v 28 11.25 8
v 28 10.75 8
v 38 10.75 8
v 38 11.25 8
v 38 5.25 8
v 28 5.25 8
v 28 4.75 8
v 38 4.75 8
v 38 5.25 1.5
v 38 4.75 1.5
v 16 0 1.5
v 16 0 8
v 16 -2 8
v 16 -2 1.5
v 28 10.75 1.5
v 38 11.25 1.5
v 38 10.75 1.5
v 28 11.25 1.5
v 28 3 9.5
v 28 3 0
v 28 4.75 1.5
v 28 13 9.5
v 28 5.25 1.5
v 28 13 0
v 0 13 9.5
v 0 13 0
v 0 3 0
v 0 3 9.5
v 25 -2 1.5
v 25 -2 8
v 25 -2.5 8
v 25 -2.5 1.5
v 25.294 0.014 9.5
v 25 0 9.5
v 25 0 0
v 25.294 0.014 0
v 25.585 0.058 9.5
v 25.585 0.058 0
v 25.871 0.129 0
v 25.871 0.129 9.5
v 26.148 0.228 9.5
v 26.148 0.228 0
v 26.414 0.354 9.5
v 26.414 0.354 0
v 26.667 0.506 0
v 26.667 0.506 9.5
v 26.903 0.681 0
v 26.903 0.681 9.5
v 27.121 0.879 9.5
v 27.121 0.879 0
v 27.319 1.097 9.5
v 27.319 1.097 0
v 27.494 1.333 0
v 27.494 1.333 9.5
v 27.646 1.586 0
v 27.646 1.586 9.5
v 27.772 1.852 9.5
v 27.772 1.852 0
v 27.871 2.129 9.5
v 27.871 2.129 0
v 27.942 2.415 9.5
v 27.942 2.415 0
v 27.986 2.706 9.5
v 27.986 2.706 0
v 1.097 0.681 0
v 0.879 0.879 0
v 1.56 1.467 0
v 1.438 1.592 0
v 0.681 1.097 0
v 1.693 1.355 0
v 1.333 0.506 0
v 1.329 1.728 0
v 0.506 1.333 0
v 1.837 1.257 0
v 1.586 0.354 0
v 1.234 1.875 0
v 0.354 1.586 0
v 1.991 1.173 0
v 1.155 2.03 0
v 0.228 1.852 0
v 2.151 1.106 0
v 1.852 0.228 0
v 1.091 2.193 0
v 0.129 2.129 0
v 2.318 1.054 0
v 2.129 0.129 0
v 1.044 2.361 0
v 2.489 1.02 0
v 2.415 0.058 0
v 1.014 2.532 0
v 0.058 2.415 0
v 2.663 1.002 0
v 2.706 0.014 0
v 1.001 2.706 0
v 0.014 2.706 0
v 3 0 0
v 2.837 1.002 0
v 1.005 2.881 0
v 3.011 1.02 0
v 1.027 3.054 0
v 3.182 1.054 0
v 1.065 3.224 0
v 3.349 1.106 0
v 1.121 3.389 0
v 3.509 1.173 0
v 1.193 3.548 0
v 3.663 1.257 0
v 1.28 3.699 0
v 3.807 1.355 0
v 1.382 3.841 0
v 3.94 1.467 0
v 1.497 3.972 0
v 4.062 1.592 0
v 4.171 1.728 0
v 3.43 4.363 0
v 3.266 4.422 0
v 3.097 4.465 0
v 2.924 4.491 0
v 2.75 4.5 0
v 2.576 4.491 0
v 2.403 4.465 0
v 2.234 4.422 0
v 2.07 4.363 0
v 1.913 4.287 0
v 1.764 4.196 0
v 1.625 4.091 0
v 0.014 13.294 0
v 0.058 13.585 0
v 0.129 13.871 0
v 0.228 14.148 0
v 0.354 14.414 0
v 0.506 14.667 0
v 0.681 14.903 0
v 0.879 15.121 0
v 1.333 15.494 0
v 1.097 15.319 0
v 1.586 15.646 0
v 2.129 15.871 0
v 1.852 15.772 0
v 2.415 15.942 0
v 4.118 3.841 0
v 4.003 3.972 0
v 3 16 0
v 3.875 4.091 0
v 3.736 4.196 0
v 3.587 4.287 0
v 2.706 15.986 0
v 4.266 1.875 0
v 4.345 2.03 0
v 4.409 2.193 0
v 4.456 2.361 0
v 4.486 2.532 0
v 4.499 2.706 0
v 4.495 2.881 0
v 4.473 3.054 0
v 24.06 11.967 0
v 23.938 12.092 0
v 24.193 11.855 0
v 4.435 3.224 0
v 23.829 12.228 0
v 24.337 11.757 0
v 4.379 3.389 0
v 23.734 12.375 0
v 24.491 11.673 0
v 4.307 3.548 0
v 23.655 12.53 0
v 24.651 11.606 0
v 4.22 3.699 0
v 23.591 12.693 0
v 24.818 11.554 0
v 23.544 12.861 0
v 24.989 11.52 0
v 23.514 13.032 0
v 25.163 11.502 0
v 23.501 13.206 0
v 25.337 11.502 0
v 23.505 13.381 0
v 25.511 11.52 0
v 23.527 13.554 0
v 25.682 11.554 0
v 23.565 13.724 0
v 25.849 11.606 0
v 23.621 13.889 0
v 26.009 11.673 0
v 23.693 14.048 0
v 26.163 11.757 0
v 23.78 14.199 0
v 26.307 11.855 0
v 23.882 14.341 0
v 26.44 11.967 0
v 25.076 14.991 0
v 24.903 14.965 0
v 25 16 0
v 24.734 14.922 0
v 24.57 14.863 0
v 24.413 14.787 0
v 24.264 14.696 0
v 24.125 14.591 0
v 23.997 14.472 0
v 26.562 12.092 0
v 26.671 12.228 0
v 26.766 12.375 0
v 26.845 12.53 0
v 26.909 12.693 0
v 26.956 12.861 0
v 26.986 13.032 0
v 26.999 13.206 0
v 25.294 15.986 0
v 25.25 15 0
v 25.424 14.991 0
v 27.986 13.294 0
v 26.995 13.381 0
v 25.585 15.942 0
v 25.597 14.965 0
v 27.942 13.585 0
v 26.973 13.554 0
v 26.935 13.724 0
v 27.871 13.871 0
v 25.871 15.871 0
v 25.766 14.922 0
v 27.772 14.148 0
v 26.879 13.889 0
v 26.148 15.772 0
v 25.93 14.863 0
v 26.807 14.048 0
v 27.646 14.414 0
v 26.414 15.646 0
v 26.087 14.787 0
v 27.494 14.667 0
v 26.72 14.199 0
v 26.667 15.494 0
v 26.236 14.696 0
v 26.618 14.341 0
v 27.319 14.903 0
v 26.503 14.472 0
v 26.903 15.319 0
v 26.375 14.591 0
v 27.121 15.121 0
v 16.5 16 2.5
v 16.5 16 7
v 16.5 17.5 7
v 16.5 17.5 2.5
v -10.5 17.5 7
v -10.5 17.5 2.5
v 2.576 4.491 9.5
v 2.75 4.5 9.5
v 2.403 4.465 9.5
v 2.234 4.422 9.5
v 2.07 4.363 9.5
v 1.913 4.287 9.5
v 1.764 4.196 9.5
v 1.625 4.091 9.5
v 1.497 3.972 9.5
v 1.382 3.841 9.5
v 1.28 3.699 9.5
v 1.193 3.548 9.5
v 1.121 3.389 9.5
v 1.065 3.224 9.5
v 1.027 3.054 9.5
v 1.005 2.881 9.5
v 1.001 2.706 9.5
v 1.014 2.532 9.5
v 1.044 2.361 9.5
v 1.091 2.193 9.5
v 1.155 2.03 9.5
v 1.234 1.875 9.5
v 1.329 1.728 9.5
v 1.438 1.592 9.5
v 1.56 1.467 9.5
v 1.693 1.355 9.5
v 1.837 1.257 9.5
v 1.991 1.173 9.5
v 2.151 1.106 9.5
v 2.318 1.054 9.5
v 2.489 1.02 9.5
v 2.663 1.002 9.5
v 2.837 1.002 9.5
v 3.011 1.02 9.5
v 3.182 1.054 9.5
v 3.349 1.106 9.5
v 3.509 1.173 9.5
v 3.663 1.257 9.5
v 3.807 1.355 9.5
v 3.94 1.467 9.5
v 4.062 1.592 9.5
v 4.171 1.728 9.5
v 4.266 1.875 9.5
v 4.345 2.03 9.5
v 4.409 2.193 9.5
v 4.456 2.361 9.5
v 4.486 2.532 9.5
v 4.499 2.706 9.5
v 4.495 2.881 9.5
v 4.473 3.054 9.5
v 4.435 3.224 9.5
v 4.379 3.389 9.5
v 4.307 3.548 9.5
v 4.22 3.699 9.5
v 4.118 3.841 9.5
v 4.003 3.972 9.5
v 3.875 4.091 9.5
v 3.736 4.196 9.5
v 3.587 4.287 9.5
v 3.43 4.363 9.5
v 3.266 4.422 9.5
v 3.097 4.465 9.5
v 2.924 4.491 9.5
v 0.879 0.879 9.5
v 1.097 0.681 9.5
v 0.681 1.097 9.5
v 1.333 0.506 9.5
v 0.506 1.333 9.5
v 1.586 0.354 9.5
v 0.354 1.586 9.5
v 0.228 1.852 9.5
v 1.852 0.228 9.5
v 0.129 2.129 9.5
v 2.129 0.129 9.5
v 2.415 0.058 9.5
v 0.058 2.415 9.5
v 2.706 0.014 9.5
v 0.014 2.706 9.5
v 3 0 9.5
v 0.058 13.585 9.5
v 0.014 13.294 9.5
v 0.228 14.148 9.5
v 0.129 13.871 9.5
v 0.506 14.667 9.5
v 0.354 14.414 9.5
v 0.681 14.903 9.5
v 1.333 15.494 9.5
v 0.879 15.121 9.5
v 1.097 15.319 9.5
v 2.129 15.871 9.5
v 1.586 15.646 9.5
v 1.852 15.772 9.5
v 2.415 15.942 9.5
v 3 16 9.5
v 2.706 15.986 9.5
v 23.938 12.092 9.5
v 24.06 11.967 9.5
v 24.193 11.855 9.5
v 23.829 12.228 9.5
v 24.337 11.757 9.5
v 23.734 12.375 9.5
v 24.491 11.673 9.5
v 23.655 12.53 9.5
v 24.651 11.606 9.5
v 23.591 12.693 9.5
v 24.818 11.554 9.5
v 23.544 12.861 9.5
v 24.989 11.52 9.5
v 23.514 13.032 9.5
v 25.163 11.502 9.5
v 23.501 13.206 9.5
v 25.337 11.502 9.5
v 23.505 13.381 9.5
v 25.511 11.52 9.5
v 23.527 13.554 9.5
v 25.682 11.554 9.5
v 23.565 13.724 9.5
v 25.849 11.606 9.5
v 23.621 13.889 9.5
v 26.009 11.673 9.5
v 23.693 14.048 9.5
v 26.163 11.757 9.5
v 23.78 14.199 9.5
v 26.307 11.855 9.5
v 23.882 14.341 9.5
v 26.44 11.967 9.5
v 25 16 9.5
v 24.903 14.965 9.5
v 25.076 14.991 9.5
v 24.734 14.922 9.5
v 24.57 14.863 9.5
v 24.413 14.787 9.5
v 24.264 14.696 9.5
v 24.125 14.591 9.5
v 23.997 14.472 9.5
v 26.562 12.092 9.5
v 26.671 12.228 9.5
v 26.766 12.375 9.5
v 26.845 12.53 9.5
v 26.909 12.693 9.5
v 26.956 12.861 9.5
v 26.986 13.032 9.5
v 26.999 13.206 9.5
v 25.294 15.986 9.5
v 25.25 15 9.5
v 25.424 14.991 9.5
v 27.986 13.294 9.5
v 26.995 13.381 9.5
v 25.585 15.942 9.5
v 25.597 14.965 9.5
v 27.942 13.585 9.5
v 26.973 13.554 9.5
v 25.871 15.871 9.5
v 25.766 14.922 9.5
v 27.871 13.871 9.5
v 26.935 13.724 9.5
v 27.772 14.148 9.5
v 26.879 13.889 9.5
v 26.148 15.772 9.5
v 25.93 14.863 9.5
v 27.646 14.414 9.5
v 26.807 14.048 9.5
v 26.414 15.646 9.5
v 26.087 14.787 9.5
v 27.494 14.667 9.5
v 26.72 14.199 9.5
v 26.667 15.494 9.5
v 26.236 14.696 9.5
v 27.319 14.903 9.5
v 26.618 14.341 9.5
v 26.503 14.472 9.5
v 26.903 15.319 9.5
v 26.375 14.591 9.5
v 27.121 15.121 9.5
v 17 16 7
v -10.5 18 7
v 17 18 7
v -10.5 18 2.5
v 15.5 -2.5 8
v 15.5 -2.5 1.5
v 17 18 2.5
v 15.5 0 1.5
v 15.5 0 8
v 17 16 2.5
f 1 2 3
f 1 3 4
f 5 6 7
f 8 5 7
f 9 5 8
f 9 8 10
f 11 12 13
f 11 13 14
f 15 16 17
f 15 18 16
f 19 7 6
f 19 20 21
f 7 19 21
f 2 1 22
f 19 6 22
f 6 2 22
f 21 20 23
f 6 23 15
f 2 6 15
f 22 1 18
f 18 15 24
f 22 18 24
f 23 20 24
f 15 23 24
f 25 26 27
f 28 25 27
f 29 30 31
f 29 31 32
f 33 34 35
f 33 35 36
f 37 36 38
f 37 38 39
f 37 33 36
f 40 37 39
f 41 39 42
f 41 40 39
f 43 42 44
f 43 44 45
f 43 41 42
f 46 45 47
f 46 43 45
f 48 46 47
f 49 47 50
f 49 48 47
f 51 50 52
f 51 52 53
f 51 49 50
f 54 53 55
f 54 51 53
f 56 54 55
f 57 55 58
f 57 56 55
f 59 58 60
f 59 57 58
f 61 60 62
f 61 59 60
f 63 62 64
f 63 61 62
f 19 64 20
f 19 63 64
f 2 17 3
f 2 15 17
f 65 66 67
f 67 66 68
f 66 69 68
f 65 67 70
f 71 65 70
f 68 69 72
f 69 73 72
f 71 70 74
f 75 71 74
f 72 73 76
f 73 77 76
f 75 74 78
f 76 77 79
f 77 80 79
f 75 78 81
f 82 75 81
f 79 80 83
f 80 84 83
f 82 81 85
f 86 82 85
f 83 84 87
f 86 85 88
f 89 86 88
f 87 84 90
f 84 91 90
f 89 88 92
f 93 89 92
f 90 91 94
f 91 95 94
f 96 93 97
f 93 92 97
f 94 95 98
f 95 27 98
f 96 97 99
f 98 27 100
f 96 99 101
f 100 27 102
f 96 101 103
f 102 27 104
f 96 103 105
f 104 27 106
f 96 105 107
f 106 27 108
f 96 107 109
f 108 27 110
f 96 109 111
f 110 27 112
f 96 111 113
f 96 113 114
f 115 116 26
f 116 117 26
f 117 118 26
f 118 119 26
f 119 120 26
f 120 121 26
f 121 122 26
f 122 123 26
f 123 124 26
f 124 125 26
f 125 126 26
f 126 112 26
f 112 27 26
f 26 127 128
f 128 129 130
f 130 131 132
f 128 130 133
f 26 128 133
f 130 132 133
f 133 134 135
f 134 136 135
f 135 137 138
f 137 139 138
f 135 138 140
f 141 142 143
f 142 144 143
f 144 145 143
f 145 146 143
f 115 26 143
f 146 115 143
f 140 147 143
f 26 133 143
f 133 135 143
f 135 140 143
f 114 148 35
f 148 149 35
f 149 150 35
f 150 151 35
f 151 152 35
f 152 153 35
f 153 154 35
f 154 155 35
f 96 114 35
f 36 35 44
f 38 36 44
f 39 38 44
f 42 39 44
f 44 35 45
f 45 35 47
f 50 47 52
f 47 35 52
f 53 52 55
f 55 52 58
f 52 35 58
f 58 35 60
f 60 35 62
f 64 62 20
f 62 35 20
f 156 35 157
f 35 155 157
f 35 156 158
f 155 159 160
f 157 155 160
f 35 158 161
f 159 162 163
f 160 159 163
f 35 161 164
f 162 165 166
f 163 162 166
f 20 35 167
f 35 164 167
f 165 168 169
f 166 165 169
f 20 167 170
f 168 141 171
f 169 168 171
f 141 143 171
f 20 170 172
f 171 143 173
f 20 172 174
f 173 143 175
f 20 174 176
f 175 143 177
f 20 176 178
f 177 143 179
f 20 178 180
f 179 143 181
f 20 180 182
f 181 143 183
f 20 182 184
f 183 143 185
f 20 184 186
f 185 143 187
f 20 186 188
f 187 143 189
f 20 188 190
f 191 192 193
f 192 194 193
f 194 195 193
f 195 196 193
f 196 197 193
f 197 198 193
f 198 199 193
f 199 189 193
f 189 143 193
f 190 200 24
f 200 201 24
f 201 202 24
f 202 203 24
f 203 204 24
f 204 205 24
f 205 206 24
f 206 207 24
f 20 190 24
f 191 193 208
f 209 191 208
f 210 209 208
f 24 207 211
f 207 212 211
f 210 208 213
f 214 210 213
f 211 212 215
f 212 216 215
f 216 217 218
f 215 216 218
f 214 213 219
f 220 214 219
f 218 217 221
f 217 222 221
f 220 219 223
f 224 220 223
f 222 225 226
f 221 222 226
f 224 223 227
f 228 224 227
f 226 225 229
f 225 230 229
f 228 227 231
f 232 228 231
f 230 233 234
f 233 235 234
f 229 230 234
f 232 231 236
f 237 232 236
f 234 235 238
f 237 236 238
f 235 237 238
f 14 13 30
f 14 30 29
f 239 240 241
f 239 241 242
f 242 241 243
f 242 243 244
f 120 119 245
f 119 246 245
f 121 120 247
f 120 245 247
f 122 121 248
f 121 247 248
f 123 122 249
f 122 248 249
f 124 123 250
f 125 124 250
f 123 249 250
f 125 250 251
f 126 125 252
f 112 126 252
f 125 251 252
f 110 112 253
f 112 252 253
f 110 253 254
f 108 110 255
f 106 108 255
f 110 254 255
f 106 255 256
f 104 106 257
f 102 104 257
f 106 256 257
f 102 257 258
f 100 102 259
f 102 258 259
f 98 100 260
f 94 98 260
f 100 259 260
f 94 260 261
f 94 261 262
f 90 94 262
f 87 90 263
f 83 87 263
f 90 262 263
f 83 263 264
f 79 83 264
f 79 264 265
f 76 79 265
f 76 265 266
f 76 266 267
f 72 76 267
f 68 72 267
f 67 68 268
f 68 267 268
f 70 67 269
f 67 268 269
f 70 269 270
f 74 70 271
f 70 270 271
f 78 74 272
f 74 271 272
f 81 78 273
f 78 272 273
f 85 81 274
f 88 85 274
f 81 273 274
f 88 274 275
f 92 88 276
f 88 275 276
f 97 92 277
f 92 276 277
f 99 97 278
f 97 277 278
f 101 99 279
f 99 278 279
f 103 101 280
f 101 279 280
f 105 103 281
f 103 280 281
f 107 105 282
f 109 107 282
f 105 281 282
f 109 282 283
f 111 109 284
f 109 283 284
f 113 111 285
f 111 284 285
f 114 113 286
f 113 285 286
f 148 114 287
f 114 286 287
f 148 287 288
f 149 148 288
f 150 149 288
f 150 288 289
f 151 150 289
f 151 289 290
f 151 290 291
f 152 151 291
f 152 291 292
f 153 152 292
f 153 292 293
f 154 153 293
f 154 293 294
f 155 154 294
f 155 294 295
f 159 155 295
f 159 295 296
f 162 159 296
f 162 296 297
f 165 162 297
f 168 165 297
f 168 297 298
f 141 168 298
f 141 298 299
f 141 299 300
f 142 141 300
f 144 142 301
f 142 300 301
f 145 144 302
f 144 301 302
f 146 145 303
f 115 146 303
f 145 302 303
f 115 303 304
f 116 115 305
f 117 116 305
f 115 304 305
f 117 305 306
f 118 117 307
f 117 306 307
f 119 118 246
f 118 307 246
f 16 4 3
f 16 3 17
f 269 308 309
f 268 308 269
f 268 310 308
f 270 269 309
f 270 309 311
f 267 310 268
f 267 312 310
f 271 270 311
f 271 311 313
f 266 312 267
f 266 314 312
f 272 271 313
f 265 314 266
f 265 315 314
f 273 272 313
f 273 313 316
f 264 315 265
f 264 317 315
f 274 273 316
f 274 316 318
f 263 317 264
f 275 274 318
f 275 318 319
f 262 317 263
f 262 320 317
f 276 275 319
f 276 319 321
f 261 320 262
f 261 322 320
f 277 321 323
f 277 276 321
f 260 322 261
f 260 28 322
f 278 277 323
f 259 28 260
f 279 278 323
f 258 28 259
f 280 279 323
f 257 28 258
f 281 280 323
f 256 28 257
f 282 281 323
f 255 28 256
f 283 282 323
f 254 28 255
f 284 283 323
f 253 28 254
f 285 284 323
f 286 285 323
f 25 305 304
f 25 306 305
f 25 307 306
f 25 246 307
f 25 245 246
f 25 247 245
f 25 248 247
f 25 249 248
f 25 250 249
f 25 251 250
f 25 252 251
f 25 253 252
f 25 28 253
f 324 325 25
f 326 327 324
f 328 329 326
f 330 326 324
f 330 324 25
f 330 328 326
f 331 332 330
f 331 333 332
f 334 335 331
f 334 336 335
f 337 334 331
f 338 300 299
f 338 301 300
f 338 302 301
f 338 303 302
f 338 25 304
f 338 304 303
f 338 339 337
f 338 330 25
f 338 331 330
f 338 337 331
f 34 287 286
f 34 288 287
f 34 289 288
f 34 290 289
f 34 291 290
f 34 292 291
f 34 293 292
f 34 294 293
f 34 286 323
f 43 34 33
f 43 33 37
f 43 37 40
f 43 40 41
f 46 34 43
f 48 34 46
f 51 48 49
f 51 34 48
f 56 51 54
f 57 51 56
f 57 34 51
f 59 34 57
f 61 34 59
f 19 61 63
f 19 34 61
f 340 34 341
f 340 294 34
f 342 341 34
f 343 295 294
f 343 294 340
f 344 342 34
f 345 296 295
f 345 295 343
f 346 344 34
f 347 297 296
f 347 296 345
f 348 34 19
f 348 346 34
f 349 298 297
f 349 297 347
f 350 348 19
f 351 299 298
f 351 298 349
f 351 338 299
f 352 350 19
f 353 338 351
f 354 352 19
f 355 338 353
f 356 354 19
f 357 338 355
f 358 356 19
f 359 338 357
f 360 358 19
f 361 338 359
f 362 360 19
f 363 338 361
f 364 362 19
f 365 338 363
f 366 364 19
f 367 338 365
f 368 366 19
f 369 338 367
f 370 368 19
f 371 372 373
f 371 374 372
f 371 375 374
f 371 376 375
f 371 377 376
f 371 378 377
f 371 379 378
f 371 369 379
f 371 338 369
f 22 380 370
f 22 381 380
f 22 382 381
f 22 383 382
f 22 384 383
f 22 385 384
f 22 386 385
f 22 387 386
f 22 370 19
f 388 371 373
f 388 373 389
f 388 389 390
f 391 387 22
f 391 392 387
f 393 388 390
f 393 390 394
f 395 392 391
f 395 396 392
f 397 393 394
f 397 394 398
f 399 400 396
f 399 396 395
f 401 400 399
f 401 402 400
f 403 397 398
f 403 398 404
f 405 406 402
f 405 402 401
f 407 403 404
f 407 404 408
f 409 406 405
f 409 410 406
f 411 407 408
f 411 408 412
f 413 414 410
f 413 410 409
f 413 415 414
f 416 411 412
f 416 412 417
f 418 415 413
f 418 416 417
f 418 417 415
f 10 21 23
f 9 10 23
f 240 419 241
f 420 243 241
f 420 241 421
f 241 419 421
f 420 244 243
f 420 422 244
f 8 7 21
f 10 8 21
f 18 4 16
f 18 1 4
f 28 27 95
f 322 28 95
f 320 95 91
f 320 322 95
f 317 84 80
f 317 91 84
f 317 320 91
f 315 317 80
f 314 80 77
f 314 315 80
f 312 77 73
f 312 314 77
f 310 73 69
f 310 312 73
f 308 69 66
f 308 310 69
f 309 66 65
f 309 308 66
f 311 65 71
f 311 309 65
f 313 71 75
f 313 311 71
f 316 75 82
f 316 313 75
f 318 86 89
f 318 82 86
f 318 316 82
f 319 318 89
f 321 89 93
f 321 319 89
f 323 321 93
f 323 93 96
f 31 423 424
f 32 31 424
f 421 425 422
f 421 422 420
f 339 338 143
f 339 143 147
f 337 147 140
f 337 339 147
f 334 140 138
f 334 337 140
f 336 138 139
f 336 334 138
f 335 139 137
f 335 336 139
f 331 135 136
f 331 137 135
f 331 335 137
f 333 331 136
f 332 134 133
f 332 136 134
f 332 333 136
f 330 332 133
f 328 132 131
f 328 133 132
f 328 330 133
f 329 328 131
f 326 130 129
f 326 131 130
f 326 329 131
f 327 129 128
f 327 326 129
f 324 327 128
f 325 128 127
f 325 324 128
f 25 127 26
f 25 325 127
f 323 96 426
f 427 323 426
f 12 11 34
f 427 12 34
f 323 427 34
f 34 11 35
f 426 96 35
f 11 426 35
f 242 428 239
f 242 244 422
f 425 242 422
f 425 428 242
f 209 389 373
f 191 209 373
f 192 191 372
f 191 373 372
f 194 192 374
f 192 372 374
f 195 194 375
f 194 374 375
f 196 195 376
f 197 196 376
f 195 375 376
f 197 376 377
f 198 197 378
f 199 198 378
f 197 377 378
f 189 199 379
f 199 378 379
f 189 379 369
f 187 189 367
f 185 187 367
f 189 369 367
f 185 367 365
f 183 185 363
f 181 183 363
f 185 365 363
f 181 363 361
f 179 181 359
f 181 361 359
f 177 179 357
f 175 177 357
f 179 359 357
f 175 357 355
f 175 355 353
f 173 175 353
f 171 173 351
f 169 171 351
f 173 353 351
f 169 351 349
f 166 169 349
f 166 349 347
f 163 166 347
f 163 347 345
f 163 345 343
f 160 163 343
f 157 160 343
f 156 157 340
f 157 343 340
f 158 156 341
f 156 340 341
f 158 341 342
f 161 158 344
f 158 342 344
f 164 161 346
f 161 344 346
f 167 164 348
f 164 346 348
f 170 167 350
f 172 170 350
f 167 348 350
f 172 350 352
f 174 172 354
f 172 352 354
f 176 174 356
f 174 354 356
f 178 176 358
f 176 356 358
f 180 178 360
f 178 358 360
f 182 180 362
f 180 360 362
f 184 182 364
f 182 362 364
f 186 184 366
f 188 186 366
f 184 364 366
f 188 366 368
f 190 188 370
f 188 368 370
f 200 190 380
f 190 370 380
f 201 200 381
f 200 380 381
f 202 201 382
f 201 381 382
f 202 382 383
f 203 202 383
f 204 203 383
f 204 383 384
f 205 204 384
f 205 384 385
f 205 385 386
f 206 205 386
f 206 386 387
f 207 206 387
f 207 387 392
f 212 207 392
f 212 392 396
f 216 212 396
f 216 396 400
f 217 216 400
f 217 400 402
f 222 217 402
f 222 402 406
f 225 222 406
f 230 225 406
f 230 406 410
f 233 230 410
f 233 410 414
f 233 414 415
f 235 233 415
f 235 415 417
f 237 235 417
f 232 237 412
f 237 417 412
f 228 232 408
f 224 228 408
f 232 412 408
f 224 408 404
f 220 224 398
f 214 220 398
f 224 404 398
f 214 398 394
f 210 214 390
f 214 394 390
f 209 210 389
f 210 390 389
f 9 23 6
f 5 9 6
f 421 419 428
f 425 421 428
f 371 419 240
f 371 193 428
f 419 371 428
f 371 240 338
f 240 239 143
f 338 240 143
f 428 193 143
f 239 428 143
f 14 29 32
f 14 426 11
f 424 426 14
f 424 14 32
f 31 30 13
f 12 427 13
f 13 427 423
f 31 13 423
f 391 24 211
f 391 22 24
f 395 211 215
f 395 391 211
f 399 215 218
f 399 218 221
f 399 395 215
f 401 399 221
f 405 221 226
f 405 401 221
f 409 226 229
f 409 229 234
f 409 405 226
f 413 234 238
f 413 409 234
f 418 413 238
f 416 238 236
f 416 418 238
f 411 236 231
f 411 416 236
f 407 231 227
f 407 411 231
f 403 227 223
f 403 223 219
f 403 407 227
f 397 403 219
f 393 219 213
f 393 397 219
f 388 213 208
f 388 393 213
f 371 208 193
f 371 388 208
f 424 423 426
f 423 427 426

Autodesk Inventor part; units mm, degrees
ref_plane "YZ Plane" through (0, 0, 0) normal (1, 0, 0) x (0, 1, 0)
ref_plane "XZ Plane" through (0, 0, 0) normal (0, 1, 0) x (-1, 0, 0)
ref_plane "XY Plane" through (0, 0, 0) normal (0, 0, 1) x (1, 0, 0)
sketch "スケッチ1" plane through (0, 0, 0) normal (0, 0, 1) x (1, 0, 0)
  line L0 (0, 0) -> (28, 0)
  line L1 (28, 0) -> (28, 16)
  line L2 (28, 16) -> (0, 16)
  line L3 (0, 16) -> (0, 0)
  line L4 (0, 11.25) -> (0, 4.75)
  dimension "d0" = 28
  dimension "d1" = 16
  dimension "d2" = 6.5
  dimension "d3" = 4.75
extrude "押し出し1" add sketch "スケッチ1" along normal blind 9.5
sketch "スケッチ2" plane through (28, 0, 0) normal (1, 0, 0) x (0, 0, -1)
  line L0 (0, 16) -> (0, 0) projected
  line L1 (0, 11.25) -> (0, 4.75)
  line L2 (0, 16) -> (-9.5, 16) projected
  line L3 (-8, 16) -> (-1.5, 16)
  line L4 (-8, 11.25) -> (-1.5, 11.25)
  line L5 (-1.5, 11.25) -> (-1.5, 10.75)
  line L6 (-1.5, 10.75) -> (-8, 10.75)
  line L7 (-8, 10.75) -> (-8, 11.25)
  line L8 (-8, 4.75) -> (-1.5, 4.75)
  line L9 (-1.5, 4.75) -> (-1.5, 5.25)
  line L10 (-1.5, 5.25) -> (-8, 5.25)
  line L11 (-8, 5.25) -> (-8, 4.75)
  dimension "d6" = 6.5
  dimension "d7" = 4.75
  dimension "d8" = 6.5
  dimension "d9" = 1.5
  dimension "d10" = 0.5
  dimension "d11" = 0.5
extrude "押し出し2" add sketch "スケッチ2" along normal blind 10
sketch "スケッチ3" plane through (0, 16, 0) normal (0, 1, 0) x (1, 0, 0)
  line L0 (0, -9.5) -> (28, -9.5) projected
  line L1 (17, -9.5) -> (17, 0)
  line L2 (28, 0) -> (28, -9.5) projected
  line L3 (17, -7) -> (17, -2.5)
  line L4 (17, -7) -> (16.5, -7)
  line L5 (16.5, -7) -> (16.5, -2.5)
  line L6 (16.5, -2.5) -> (17, -2.5)
  line L7 (17, -2.5) -> (17, -7)
  point P0 (0, 0)
  dimension "d14" = 11
  dimension "d15" = 4.5
  dimension "d16" = 2.5
  dimension "d17" = 0.5
extrude "押し出し3" add sketch "スケッチ3" along normal blind 2
sketch "スケッチ4" plane through (16.5, 16, 2.5) normal (-1, 0, 0) x (0, 0, 1)
  line L0 (0, 2) -> (4.5, 2) projected
  line L1 (4.5, 0) -> (4.5, 2) projected
  line L2 (0, 2) -> (4.5, 2)
  line L3 (4.5, 2) -> (4.5, 1.5)
  line L4 (4.5, 1.5) -> (0, 1.5)
  line L5 (0, 1.5) -> (0, 2)
  point P0 (-2.5, -16)
  dimension "d20" = 0.5
extrude "押し出し4" add sketch "スケッチ4" along normal blind 27
sketch "スケッチ5" plane through (0, 0, 0) normal (0, -1, 0) x (1, 0, 0)
  line L0 (28, 9.5) -> (0, 9.5) projected
  line L1 (28, 0) -> (0, 0) projected
  line L2 (15.5, 9.5) -> (15.5, 0)
  line L3 (0, 0) -> (0, 9.5) projected
  line L4 (15.5, 8) -> (15.5, 1.5)
  line L5 (15.5, 8) -> (16, 8)
  line L6 (16, 8) -> (16, 1.5)
  line L7 (16, 1.5) -> (15.5, 1.5)
  line L8 (15.5, 1.5) -> (15.5, 8)
  dimension "d23" = 15.5
  dimension "d24" = 6.5
  dimension "d25" = 1.5
  dimension "d26" = 0.5
extrude "押し出し5" add sketch "スケッチ5" along normal blind 2.5 contours L5 L6 L7 L2
sketch "スケッチ6" plane through (16, 0, 8) normal (1, 0, 0) x (0, 0, -1)
  line L0 (0, -2.5) -> (6.5, -2.5) projected
  line L1 (0, 0) -> (0, -2.5) projected
  line L2 (6.5, -2.5) -> (0, -2.5)
  line L3 (0, -2.5) -> (0, -2)
  line L4 (0, -2) -> (6.5, -2)
  line L5 (6.5, -2) -> (6.5, -2.5)
  point P0 (8, 0)
  dimension "d29" = 0.5
extrude "押し出し6" add sketch "スケッチ6" along normal blind 9
sketch "スケッチ7" plane through (0, 0, 0) normal (0, 0, -1) x (-1, 0, 0)
  line L0 (0, 16) -> (0, 0) projected
  line L1 (-28, 16) -> (0, 16) projected
  line L2 (-28, 0) -> (-28, 16) projected
  line L3 (0, 0) -> (-28, 0) projected
  point P0 (-2.75, 2.75)
  point P1 (-25.25, 13.25)
  dimension "d32" = 2.75
  dimension "d34" = 2.75
  dimension "d35" = 13.25
  dimension "d43" = 2.75
hole "穴1" at (2.75, 2.75, 0) at (25.25, 13.25, 0) direction (0, 0, 1) diameter 3.5 end through all
fillet "フィレット1" radius 3 4 edges at (0, 0, 4.75) (0, 16, 4.75) (28, 16, 4.75) (28, 0, 4.75)
equation "\"d34\" = d32"
equation "\"d43\" = d32"
equation "\"d33\" = d32"
properties part number "switch_V_152_1A5_KM"
